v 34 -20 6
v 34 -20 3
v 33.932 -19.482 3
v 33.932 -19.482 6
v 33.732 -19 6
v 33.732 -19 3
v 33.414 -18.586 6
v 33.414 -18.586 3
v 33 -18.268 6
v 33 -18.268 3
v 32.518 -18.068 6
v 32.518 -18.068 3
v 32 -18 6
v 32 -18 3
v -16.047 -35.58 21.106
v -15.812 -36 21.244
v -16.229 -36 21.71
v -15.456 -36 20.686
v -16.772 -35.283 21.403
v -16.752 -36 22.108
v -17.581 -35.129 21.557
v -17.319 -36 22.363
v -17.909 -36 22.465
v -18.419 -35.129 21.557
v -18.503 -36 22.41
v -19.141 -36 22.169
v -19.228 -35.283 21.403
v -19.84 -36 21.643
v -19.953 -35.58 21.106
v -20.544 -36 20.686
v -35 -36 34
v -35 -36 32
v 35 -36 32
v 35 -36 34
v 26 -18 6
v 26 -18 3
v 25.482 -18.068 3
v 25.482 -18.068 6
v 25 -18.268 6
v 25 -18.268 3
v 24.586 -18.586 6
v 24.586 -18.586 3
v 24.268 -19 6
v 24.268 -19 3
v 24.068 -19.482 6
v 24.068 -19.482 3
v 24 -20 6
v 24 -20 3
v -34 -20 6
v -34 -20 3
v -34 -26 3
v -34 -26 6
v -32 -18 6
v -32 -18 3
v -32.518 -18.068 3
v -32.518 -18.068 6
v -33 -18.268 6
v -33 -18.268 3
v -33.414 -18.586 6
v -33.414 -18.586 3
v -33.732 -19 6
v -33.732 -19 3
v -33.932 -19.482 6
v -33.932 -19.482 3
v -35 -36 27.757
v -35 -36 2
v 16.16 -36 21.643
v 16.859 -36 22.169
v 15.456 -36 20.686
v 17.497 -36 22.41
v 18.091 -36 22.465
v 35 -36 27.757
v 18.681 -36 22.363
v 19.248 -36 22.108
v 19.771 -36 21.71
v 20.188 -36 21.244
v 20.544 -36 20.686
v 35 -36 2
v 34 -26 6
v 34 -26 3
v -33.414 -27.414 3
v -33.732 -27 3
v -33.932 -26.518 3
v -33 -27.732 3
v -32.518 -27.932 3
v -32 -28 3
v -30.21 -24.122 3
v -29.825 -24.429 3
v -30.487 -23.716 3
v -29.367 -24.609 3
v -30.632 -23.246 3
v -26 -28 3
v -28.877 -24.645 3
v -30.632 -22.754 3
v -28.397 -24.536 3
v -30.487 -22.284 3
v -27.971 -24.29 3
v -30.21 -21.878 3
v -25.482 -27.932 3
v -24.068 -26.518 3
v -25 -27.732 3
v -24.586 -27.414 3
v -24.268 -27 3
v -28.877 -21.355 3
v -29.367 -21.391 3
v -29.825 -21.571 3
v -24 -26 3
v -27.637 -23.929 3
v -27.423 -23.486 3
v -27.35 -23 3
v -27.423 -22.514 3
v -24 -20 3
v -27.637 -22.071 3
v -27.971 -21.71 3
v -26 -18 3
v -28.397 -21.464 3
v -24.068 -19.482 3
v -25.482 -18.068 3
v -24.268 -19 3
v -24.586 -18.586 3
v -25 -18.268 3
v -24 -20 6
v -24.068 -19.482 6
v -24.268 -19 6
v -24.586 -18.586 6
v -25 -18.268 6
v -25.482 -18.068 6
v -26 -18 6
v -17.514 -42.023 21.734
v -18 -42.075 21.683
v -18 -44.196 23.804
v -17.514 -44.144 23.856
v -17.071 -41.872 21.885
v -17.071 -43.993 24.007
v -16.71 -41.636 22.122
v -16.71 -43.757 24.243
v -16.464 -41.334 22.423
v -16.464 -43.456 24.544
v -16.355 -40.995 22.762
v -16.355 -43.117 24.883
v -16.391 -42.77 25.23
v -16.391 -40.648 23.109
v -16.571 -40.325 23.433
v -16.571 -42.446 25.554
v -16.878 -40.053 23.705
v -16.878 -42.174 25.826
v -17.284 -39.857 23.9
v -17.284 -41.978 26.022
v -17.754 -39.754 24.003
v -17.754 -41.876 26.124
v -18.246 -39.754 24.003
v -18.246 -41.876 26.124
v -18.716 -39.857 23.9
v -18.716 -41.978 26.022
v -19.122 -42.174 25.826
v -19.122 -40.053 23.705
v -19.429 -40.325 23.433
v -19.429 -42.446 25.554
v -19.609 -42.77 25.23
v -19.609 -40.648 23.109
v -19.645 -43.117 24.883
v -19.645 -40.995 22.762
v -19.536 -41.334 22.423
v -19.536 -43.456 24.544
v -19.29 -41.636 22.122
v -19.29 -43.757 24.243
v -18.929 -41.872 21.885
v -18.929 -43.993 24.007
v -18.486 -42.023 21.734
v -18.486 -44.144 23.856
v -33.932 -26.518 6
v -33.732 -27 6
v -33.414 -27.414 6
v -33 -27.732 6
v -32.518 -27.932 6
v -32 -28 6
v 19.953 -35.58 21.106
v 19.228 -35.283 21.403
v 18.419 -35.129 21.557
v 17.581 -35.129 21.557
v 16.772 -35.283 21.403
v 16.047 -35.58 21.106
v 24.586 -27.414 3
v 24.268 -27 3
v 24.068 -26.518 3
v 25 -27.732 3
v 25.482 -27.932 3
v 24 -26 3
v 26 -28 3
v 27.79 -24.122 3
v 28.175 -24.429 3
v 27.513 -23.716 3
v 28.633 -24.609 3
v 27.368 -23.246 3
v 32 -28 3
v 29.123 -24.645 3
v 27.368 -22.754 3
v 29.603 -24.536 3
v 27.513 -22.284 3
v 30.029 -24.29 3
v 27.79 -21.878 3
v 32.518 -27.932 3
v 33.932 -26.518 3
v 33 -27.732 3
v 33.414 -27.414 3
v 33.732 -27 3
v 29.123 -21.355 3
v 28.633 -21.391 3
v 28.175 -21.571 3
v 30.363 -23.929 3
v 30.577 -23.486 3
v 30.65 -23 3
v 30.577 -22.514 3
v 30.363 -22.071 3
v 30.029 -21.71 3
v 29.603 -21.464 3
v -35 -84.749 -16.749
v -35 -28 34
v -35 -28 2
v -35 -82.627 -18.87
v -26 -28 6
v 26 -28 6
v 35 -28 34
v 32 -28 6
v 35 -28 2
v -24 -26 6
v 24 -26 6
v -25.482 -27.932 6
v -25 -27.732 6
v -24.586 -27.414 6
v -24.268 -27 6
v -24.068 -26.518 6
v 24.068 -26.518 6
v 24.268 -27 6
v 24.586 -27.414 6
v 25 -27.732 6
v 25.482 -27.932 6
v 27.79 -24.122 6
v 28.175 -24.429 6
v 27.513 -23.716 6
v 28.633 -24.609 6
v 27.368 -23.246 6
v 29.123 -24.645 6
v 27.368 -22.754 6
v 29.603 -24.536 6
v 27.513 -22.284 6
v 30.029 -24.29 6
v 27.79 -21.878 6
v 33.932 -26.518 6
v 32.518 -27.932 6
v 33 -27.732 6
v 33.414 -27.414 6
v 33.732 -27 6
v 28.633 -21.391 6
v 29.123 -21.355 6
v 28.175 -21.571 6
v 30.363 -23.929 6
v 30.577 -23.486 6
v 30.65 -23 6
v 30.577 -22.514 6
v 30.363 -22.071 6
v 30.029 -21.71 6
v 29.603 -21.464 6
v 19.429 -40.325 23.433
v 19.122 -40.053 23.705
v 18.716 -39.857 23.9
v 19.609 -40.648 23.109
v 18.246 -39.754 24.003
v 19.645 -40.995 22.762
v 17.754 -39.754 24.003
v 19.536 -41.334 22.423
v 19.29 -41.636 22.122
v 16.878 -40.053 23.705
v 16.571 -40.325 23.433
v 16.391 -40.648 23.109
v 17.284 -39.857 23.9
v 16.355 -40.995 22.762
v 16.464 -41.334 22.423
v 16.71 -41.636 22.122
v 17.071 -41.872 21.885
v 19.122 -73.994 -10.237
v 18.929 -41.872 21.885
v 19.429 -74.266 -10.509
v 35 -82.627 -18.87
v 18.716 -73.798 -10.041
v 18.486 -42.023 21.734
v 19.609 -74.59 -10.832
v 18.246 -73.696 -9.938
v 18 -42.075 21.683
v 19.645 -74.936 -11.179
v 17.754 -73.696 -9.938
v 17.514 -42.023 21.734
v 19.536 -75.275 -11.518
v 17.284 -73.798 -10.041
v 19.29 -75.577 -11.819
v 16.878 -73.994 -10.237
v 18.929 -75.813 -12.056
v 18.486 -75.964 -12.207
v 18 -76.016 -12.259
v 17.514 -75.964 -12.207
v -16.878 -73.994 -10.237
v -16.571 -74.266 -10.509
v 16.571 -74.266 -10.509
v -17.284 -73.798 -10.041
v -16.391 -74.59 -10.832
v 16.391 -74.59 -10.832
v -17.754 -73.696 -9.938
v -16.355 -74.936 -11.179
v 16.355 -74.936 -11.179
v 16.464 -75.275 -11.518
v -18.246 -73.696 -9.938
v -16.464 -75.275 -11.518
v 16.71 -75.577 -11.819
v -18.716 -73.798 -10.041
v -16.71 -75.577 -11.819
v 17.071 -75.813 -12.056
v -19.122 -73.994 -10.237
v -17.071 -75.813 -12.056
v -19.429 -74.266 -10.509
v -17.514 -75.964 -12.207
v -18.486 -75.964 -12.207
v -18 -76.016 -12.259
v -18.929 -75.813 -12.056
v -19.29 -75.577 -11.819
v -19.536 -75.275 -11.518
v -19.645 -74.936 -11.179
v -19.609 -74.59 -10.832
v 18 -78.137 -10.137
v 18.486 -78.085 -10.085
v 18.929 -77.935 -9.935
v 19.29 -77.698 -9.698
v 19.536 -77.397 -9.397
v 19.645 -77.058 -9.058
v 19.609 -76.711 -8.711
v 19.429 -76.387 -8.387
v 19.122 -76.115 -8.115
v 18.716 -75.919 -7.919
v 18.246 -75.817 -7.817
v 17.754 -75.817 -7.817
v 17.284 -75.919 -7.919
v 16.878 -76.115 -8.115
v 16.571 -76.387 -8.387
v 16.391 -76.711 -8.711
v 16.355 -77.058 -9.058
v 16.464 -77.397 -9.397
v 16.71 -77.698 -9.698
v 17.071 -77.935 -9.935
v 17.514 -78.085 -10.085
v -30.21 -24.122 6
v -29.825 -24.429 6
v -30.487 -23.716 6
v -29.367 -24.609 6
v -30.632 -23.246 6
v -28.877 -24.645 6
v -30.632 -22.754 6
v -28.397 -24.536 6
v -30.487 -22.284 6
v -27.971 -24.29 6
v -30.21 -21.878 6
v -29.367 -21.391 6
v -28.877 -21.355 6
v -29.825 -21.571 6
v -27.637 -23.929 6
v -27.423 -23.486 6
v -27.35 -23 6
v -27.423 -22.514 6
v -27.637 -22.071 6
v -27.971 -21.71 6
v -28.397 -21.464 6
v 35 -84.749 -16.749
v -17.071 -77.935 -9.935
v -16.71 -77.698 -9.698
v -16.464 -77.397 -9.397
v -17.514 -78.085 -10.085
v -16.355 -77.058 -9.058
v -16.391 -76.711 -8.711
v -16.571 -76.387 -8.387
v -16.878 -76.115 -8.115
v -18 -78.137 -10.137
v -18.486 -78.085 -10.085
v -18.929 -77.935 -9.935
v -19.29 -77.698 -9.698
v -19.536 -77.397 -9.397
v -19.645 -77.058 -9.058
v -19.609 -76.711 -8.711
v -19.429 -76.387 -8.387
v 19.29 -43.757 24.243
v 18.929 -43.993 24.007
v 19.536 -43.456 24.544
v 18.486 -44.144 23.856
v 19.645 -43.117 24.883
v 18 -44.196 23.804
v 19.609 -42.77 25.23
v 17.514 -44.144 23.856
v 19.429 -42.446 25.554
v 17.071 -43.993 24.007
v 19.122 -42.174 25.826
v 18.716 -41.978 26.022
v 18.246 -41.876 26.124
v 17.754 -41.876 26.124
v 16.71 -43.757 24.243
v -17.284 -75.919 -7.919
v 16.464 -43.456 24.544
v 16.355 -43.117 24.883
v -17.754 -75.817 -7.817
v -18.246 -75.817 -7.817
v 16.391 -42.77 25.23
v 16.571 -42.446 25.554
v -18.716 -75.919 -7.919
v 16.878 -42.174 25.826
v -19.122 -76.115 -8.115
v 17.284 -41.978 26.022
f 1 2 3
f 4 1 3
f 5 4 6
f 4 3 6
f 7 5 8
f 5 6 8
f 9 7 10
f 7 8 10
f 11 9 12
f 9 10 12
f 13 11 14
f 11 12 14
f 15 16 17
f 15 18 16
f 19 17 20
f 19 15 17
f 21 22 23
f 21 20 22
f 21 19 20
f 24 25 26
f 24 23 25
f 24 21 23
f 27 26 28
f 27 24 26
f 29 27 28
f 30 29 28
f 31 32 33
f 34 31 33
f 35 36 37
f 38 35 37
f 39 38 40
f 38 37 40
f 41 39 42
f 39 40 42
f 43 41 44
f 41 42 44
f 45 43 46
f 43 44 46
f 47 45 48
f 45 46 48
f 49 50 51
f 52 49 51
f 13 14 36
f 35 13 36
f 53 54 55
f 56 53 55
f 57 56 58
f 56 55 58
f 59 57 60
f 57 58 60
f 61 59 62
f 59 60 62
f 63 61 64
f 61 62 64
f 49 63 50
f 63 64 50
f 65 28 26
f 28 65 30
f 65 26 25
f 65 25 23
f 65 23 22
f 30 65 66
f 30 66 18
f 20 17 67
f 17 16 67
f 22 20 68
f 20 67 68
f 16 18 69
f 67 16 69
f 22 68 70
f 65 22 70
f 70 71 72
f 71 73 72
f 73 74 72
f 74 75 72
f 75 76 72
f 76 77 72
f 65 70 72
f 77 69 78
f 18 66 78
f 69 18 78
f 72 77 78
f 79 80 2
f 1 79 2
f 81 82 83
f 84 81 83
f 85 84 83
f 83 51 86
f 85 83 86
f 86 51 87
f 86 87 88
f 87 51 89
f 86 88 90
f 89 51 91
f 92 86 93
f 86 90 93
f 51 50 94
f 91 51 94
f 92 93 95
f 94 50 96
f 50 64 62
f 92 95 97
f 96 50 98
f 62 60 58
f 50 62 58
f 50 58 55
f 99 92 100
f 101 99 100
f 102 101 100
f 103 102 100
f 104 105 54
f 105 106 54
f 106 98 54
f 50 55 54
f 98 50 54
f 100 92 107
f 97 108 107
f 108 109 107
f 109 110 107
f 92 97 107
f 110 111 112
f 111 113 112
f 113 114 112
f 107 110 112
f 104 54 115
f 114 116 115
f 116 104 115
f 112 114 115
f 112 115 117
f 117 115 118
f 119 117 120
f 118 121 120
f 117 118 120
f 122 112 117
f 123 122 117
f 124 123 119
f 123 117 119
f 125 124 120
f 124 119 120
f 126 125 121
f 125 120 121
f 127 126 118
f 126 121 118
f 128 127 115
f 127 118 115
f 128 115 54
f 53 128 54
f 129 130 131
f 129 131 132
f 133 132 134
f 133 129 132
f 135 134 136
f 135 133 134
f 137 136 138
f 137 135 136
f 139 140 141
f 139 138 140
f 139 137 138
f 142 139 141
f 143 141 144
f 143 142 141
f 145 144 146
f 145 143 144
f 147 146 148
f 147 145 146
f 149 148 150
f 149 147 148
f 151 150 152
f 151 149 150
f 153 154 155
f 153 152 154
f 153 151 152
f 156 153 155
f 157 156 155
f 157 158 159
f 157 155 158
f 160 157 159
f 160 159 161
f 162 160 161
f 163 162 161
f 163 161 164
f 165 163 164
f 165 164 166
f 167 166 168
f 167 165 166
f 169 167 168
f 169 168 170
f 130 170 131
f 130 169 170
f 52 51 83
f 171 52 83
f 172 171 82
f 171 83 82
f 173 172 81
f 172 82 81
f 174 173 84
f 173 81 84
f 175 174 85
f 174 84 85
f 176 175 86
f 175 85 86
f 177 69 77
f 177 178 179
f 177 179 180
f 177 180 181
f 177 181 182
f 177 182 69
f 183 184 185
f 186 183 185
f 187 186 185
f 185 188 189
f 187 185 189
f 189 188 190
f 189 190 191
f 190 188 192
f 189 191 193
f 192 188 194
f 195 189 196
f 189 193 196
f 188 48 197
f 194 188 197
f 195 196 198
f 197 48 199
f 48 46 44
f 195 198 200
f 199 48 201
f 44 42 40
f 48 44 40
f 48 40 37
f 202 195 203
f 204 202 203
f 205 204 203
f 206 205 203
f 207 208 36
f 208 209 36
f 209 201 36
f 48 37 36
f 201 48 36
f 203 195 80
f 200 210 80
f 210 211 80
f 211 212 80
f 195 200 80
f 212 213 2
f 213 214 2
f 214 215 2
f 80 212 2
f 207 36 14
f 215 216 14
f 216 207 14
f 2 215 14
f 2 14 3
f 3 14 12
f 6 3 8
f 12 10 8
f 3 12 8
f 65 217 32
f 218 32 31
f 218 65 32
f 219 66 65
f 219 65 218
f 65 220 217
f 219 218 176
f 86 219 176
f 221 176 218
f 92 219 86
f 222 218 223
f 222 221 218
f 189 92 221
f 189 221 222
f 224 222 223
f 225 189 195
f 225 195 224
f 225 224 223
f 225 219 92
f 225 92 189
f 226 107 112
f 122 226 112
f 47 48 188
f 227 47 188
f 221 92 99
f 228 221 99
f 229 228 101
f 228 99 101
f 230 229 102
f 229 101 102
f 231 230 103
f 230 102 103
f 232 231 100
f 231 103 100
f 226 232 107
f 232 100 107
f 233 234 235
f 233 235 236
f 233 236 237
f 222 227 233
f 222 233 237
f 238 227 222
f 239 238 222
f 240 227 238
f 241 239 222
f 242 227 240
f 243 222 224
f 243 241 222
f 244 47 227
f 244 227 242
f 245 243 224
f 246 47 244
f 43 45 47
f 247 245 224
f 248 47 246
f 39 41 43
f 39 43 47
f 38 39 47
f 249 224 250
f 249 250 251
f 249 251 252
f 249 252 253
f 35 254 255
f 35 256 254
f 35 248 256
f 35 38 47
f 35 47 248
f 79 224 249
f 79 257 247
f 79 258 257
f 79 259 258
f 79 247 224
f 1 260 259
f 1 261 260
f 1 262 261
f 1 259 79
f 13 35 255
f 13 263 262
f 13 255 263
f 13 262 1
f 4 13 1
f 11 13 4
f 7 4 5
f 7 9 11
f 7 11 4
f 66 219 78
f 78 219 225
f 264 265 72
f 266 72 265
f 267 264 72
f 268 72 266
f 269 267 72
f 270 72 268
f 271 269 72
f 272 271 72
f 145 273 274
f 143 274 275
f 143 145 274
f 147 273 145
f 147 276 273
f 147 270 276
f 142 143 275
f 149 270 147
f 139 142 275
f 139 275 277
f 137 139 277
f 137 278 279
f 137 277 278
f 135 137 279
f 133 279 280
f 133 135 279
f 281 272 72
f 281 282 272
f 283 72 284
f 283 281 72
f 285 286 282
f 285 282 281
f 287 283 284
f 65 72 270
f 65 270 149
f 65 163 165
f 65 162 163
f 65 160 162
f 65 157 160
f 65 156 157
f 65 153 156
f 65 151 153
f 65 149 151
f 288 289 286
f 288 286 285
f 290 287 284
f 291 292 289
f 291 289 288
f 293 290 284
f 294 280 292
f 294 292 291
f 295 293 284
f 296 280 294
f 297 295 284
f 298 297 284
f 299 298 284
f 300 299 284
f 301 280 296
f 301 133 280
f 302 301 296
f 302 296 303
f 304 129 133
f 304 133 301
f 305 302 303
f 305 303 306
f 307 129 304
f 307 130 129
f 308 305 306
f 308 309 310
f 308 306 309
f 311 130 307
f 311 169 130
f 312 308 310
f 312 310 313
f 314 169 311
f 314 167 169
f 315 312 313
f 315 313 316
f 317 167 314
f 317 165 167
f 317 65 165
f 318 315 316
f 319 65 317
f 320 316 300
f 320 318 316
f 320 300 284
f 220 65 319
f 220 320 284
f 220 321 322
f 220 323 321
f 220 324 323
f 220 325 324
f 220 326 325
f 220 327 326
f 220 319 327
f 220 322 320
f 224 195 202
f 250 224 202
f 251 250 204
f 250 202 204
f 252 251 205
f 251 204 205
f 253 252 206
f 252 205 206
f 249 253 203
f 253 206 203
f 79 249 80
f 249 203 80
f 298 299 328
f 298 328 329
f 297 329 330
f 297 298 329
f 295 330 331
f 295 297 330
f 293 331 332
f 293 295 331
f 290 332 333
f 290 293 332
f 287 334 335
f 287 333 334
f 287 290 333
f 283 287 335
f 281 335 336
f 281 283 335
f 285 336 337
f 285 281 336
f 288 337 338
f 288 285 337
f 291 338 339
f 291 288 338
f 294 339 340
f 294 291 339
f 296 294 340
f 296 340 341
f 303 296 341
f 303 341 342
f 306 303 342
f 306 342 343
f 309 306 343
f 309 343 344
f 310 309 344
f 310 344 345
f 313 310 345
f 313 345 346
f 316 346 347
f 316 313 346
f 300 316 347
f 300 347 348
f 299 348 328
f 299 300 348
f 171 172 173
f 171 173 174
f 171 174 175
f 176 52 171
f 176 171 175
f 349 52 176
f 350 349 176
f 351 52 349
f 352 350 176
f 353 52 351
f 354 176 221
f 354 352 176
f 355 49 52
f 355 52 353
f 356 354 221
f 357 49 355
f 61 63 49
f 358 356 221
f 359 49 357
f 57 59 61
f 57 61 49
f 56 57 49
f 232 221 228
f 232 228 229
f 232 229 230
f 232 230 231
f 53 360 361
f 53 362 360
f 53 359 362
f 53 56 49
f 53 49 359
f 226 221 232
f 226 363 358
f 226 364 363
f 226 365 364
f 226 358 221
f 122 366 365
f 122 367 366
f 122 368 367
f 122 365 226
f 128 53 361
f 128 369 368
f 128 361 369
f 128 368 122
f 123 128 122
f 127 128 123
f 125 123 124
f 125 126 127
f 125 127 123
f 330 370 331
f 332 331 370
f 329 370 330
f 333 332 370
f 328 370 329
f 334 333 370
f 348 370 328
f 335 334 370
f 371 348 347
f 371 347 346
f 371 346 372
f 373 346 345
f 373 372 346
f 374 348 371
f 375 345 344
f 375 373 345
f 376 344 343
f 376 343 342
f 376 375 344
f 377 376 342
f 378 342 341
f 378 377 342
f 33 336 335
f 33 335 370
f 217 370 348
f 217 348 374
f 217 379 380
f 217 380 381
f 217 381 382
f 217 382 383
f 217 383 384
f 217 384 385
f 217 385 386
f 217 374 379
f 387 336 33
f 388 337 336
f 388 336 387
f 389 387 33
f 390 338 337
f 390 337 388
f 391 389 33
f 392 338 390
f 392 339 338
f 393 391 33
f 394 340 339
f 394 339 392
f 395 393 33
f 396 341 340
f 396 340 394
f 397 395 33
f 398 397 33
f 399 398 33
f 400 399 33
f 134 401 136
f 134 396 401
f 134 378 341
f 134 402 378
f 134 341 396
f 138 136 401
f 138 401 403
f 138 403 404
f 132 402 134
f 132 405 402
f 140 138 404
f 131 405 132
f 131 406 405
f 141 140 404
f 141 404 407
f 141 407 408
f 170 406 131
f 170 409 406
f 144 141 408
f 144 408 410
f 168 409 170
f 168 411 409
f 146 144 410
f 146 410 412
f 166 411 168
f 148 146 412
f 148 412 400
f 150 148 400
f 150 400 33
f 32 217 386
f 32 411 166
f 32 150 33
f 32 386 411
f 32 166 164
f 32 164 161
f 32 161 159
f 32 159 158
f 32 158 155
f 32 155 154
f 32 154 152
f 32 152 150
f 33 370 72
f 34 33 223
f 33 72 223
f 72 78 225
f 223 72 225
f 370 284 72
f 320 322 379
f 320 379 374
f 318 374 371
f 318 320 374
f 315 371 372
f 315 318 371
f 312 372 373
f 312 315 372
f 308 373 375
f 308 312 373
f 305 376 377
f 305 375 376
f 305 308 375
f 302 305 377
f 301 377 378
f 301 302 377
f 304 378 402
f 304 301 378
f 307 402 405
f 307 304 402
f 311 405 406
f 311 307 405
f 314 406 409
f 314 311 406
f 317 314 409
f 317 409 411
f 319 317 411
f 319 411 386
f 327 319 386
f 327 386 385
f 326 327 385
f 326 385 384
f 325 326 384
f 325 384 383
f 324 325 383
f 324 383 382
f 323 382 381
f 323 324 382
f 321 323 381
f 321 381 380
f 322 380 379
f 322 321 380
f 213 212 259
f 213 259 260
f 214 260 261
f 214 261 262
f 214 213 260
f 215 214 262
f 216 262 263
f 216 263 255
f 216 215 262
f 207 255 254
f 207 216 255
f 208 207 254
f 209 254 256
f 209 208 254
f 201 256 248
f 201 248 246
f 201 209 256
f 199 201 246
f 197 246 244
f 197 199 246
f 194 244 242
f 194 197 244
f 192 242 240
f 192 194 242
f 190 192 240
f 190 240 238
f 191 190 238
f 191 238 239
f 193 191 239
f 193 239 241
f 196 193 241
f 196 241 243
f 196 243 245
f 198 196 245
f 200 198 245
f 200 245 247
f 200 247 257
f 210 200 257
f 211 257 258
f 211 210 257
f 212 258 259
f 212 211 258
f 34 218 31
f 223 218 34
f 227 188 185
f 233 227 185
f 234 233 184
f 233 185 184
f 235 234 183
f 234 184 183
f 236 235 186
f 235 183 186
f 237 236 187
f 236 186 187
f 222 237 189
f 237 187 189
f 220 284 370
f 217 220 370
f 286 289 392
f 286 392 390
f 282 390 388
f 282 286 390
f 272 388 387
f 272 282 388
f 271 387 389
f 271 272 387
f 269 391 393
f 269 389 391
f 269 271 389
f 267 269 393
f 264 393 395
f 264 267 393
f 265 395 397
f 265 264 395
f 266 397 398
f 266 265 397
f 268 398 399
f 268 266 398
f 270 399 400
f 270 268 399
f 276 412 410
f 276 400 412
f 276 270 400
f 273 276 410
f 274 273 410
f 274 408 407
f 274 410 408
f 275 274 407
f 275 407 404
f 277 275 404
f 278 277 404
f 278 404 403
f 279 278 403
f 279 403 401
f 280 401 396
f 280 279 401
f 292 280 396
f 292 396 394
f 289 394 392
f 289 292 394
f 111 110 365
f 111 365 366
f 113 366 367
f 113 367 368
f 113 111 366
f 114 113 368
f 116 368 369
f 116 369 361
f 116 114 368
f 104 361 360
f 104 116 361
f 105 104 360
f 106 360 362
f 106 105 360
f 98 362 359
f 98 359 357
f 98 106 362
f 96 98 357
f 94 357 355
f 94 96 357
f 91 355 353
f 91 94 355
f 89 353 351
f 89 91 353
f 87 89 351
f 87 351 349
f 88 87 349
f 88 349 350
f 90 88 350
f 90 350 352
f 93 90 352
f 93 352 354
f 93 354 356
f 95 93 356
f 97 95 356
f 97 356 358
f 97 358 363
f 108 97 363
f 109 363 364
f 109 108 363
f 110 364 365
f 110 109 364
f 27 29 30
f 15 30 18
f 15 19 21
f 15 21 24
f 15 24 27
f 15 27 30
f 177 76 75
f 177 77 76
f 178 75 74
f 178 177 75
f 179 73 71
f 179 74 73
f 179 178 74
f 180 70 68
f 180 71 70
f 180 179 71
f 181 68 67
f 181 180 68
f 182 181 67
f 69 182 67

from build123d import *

# Parameters (mm, degrees)
F_70MM_45_3MM_START   = -35
F_70MM_45_3MM_DEPTH   = 70
EXTRUDE_START         = 2
SKETCH_8_W            = 70
SKETCH_8_H            = 8
EXTRUDE_307_DEPTH     = 32
EXTRUDE_START_2       = 3
SKETCH_9_R            = 1.65
EXTRUDE_M3_1_DEPTH    = 3
SKETCH_10_R           = 1.65
EXTRUDE_M3_1_2_DEPTH  = 3
F_36X48_M3_DEPTH      = 3.1
F_36X48_M3_DEPTH_BACK = 3.1
SKETCH_11_R           = 1.65
CUT_EXTRUDE_START     = -8
SKETCH_12_R           = 3.2
CUT_EXTRUDE_818_DEPTH = 3.8


with BuildPart() as part:
    # 草图1 → 70mm紧凑45度雷达承托面_3mm (new body)
    with BuildSketch(Plane(origin=(0, 0, 0), x_dir=(0, 0, -1), z_dir=(1, 0, 0)).offset(F_70MM_45_3MM_START)):
        Polygon((16.748737342, -84.748737342), (-32.748737342, -35.251262658), (-30.627416998, -33.129942315), (18.870057685, -82.627416998), align=None)
    extrude(amount=F_70MM_45_3MM_DEPTH)

    # 草图8 → Extrude 307 (add)
    with BuildSketch(Plane.XY.offset(EXTRUDE_START)):
        with Locations((0, -32)):
            Rectangle(SKETCH_8_W, SKETCH_8_H)
    extrude(amount=EXTRUDE_307_DEPTH)

    # 草图9 → Extrude M3__-1 (add)
    with BuildSketch(Plane.XY.offset(EXTRUDE_START_2)):
        with BuildLine():
            Line((-32, -28), (-26, -28))
            ThreePointArc((-26, -28), (-24.585786438, -27.414213562), (-24, -26))
            Line((-24, -26), (-24, -20))
            ThreePointArc((-24, -20), (-24.585786438, -18.585786438), (-26, -18))
            Line((-26, -18), (-32, -18))
            ThreePointArc((-32, -18), (-33.414213562, -18.585786438), (-34, -20))
            Line((-34, -20), (-34, -26))
            ThreePointArc((-34, -26), (-33.414213562, -27.414213562), (-32, -28))
        make_face()
        with Locations((-29, -23)):
            Circle(SKETCH_9_R, mode=Mode.SUBTRACT)
    extrude(amount=EXTRUDE_M3_1_DEPTH)

    # 草图10 → Extrude M3__1 2 (add)
    with BuildSketch(Plane.XY.offset(EXTRUDE_START_2)):
        with BuildLine():
            Line((26, -28), (32, -28))
            ThreePointArc((32, -28), (33.414213562, -27.414213562), (34, -26))
            Line((34, -26), (34, -20))
            ThreePointArc((34, -20), (33.414213562, -18.585786438), (32, -18))
            Line((32, -18), (26, -18))
            ThreePointArc((26, -18), (24.585786438, -18.585786438), (24, -20))
            Line((24, -20), (24, -26))
            ThreePointArc((24, -26), (24.585786438, -27.414213562), (26, -28))
        make_face()
        with Locations((29, -23)):
            Circle(SKETCH_10_R, mode=Mode.SUBTRACT)
    extrude(amount=EXTRUDE_M3_1_2_DEPTH)

    # 草图11 → 端口朝下雷达36x48四M3孔 (cut, two sides: drawn at the far end of the back side and taken through both)
    with BuildSketch(Plane(origin=(0, -34, 34), x_dir=(1, 0, 0), z_dir=(0, -0.7071067811865477, 0.7071067811865475)).offset(-F_36X48_M3_DEPTH_BACK)):
        with Locations(Location((-18, -60.769552622, 0), (0, 0, 270))):
            Circle(SKETCH_11_R)
        with Locations(Location((-18, -12.769552622, 0), (0, 0, 270))):
            Circle(SKETCH_11_R)
        with Locations(Location((18, -60.769552622, 0), (0, 0, 270))):
            Circle(SKETCH_11_R)
        with Locations(Location((18, -12.769552622, 0), (0, 0, 270))):
            Circle(SKETCH_11_R)
    extrude(amount=F_36X48_M3_DEPTH + F_36X48_M3_DEPTH_BACK, mode=Mode.SUBTRACT)

    # 草图12 → Cut-Extrude 818 (cut)
    with BuildSketch(Plane(origin=(0, -34, 34), x_dir=(1, 0, 0), z_dir=(0, -0.7071067811865477, 0.7071067811865475)).offset(CUT_EXTRUDE_START)):
        with Locations((-18, -12.769552622)):
            Circle(SKETCH_12_R)
        with Locations((18, -12.769552622)):
            Circle(SKETCH_12_R)
    extrude(amount=CUT_EXTRUDE_818_DEPTH, mode=Mode.SUBTRACT)


solid = part.part
